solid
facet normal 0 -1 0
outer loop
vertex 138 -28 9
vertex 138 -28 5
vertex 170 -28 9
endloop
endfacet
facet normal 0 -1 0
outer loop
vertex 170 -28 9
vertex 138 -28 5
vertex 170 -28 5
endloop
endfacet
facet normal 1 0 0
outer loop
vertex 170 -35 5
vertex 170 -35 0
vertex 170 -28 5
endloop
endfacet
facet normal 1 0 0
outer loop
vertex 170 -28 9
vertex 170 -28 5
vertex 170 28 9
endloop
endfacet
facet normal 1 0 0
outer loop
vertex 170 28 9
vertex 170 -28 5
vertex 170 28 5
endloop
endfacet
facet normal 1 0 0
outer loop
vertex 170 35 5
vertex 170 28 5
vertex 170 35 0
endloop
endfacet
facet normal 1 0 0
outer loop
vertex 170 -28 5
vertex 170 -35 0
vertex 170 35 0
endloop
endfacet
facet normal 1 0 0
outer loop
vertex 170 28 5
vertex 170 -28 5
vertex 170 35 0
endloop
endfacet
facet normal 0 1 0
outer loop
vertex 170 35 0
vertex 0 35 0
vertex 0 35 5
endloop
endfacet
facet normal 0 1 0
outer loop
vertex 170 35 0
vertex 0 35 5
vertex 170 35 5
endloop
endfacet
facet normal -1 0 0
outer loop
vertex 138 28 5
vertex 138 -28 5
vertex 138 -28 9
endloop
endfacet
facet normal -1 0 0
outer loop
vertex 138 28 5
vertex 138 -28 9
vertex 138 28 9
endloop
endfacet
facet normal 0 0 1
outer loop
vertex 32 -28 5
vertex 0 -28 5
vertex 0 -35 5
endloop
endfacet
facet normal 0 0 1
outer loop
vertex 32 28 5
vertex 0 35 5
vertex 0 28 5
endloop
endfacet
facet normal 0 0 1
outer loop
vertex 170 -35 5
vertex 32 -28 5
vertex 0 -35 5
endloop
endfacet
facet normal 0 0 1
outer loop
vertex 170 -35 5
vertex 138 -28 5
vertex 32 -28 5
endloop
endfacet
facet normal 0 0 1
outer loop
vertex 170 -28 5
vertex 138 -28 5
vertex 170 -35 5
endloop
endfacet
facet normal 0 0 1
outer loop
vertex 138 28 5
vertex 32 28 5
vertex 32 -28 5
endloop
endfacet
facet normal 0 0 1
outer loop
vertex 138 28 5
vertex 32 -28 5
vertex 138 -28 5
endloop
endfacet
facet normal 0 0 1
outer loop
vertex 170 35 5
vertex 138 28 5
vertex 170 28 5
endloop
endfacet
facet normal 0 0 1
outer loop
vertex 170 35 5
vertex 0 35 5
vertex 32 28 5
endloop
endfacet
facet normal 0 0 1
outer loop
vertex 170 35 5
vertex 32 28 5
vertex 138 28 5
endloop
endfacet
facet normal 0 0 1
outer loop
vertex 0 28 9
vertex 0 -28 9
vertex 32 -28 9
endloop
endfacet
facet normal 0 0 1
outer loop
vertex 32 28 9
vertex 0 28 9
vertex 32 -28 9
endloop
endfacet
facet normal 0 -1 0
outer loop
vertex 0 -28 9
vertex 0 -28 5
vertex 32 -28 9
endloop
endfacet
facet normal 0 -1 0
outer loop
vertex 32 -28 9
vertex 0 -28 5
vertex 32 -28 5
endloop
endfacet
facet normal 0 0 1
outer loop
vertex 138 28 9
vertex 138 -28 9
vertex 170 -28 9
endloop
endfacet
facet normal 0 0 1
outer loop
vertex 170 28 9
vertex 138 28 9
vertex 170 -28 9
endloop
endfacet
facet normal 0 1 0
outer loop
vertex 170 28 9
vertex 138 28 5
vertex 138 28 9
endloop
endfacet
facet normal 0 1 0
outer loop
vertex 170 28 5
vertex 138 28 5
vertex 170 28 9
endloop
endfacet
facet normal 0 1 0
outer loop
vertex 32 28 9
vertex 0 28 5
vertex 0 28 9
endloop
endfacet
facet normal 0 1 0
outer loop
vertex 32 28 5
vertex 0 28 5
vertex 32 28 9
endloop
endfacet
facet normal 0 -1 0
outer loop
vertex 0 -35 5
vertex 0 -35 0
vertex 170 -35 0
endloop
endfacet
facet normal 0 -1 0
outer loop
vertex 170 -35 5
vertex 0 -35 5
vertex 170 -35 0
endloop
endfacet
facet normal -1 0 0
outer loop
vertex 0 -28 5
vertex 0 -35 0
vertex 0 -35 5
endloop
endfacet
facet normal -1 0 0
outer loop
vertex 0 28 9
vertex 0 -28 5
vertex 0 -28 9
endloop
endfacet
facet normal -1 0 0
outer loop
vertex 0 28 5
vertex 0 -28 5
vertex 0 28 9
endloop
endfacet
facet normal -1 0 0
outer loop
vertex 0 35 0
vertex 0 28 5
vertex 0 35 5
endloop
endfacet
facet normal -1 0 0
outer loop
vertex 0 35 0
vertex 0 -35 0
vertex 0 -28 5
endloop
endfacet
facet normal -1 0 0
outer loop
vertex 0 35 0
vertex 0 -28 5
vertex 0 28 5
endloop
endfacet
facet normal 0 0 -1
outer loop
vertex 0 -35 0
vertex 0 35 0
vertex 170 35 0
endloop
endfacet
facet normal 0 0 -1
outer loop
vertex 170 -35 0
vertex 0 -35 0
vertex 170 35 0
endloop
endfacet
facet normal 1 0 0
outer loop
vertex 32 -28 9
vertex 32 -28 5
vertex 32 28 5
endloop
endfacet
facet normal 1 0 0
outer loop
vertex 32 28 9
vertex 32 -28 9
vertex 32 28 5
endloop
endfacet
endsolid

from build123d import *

# Parameters (mm, degrees)
BOX013_W     = 32
BOX013_H     = 56
BOX013_DEPTH = 4
BOX002_W     = 170
BOX002_H     = 70
BOX002_DEPTH = 5


with BuildPart() as soporte_motor:
    # Box013 → Box013 (new body)
    with BuildSketch(Plane(origin=(0, -28, 5), x_dir=(1, 0, 0), z_dir=(0, 0, 1))):
        with Locations((16, 28)):
            Rectangle(BOX013_W, BOX013_H)
    extrude(amount=BOX013_DEPTH)


with BuildPart() as plancha_abajo:
    # Box002 → Box002 (new body)
    with BuildSketch(Plane(origin=(0, -35, 0), x_dir=(1, 0, 0), z_dir=(0, 0, 1))):
        with Locations((85, 35)):
            Rectangle(BOX002_W, BOX002_H)
    extrude(amount=BOX002_DEPTH)


with BuildPart() as base:
    # Link011 base: copy of soporte motor
    add(soporte_motor.part)


with BuildPart() as base_1:
    # Link011 placement: moved
    add(base.part.moved(Location((138, 0, 0))))

    # Fusion008: union soporte motor, Plancha abajo
    add(soporte_motor.part)
    add(plancha_abajo.part)


solid = base_1.part
